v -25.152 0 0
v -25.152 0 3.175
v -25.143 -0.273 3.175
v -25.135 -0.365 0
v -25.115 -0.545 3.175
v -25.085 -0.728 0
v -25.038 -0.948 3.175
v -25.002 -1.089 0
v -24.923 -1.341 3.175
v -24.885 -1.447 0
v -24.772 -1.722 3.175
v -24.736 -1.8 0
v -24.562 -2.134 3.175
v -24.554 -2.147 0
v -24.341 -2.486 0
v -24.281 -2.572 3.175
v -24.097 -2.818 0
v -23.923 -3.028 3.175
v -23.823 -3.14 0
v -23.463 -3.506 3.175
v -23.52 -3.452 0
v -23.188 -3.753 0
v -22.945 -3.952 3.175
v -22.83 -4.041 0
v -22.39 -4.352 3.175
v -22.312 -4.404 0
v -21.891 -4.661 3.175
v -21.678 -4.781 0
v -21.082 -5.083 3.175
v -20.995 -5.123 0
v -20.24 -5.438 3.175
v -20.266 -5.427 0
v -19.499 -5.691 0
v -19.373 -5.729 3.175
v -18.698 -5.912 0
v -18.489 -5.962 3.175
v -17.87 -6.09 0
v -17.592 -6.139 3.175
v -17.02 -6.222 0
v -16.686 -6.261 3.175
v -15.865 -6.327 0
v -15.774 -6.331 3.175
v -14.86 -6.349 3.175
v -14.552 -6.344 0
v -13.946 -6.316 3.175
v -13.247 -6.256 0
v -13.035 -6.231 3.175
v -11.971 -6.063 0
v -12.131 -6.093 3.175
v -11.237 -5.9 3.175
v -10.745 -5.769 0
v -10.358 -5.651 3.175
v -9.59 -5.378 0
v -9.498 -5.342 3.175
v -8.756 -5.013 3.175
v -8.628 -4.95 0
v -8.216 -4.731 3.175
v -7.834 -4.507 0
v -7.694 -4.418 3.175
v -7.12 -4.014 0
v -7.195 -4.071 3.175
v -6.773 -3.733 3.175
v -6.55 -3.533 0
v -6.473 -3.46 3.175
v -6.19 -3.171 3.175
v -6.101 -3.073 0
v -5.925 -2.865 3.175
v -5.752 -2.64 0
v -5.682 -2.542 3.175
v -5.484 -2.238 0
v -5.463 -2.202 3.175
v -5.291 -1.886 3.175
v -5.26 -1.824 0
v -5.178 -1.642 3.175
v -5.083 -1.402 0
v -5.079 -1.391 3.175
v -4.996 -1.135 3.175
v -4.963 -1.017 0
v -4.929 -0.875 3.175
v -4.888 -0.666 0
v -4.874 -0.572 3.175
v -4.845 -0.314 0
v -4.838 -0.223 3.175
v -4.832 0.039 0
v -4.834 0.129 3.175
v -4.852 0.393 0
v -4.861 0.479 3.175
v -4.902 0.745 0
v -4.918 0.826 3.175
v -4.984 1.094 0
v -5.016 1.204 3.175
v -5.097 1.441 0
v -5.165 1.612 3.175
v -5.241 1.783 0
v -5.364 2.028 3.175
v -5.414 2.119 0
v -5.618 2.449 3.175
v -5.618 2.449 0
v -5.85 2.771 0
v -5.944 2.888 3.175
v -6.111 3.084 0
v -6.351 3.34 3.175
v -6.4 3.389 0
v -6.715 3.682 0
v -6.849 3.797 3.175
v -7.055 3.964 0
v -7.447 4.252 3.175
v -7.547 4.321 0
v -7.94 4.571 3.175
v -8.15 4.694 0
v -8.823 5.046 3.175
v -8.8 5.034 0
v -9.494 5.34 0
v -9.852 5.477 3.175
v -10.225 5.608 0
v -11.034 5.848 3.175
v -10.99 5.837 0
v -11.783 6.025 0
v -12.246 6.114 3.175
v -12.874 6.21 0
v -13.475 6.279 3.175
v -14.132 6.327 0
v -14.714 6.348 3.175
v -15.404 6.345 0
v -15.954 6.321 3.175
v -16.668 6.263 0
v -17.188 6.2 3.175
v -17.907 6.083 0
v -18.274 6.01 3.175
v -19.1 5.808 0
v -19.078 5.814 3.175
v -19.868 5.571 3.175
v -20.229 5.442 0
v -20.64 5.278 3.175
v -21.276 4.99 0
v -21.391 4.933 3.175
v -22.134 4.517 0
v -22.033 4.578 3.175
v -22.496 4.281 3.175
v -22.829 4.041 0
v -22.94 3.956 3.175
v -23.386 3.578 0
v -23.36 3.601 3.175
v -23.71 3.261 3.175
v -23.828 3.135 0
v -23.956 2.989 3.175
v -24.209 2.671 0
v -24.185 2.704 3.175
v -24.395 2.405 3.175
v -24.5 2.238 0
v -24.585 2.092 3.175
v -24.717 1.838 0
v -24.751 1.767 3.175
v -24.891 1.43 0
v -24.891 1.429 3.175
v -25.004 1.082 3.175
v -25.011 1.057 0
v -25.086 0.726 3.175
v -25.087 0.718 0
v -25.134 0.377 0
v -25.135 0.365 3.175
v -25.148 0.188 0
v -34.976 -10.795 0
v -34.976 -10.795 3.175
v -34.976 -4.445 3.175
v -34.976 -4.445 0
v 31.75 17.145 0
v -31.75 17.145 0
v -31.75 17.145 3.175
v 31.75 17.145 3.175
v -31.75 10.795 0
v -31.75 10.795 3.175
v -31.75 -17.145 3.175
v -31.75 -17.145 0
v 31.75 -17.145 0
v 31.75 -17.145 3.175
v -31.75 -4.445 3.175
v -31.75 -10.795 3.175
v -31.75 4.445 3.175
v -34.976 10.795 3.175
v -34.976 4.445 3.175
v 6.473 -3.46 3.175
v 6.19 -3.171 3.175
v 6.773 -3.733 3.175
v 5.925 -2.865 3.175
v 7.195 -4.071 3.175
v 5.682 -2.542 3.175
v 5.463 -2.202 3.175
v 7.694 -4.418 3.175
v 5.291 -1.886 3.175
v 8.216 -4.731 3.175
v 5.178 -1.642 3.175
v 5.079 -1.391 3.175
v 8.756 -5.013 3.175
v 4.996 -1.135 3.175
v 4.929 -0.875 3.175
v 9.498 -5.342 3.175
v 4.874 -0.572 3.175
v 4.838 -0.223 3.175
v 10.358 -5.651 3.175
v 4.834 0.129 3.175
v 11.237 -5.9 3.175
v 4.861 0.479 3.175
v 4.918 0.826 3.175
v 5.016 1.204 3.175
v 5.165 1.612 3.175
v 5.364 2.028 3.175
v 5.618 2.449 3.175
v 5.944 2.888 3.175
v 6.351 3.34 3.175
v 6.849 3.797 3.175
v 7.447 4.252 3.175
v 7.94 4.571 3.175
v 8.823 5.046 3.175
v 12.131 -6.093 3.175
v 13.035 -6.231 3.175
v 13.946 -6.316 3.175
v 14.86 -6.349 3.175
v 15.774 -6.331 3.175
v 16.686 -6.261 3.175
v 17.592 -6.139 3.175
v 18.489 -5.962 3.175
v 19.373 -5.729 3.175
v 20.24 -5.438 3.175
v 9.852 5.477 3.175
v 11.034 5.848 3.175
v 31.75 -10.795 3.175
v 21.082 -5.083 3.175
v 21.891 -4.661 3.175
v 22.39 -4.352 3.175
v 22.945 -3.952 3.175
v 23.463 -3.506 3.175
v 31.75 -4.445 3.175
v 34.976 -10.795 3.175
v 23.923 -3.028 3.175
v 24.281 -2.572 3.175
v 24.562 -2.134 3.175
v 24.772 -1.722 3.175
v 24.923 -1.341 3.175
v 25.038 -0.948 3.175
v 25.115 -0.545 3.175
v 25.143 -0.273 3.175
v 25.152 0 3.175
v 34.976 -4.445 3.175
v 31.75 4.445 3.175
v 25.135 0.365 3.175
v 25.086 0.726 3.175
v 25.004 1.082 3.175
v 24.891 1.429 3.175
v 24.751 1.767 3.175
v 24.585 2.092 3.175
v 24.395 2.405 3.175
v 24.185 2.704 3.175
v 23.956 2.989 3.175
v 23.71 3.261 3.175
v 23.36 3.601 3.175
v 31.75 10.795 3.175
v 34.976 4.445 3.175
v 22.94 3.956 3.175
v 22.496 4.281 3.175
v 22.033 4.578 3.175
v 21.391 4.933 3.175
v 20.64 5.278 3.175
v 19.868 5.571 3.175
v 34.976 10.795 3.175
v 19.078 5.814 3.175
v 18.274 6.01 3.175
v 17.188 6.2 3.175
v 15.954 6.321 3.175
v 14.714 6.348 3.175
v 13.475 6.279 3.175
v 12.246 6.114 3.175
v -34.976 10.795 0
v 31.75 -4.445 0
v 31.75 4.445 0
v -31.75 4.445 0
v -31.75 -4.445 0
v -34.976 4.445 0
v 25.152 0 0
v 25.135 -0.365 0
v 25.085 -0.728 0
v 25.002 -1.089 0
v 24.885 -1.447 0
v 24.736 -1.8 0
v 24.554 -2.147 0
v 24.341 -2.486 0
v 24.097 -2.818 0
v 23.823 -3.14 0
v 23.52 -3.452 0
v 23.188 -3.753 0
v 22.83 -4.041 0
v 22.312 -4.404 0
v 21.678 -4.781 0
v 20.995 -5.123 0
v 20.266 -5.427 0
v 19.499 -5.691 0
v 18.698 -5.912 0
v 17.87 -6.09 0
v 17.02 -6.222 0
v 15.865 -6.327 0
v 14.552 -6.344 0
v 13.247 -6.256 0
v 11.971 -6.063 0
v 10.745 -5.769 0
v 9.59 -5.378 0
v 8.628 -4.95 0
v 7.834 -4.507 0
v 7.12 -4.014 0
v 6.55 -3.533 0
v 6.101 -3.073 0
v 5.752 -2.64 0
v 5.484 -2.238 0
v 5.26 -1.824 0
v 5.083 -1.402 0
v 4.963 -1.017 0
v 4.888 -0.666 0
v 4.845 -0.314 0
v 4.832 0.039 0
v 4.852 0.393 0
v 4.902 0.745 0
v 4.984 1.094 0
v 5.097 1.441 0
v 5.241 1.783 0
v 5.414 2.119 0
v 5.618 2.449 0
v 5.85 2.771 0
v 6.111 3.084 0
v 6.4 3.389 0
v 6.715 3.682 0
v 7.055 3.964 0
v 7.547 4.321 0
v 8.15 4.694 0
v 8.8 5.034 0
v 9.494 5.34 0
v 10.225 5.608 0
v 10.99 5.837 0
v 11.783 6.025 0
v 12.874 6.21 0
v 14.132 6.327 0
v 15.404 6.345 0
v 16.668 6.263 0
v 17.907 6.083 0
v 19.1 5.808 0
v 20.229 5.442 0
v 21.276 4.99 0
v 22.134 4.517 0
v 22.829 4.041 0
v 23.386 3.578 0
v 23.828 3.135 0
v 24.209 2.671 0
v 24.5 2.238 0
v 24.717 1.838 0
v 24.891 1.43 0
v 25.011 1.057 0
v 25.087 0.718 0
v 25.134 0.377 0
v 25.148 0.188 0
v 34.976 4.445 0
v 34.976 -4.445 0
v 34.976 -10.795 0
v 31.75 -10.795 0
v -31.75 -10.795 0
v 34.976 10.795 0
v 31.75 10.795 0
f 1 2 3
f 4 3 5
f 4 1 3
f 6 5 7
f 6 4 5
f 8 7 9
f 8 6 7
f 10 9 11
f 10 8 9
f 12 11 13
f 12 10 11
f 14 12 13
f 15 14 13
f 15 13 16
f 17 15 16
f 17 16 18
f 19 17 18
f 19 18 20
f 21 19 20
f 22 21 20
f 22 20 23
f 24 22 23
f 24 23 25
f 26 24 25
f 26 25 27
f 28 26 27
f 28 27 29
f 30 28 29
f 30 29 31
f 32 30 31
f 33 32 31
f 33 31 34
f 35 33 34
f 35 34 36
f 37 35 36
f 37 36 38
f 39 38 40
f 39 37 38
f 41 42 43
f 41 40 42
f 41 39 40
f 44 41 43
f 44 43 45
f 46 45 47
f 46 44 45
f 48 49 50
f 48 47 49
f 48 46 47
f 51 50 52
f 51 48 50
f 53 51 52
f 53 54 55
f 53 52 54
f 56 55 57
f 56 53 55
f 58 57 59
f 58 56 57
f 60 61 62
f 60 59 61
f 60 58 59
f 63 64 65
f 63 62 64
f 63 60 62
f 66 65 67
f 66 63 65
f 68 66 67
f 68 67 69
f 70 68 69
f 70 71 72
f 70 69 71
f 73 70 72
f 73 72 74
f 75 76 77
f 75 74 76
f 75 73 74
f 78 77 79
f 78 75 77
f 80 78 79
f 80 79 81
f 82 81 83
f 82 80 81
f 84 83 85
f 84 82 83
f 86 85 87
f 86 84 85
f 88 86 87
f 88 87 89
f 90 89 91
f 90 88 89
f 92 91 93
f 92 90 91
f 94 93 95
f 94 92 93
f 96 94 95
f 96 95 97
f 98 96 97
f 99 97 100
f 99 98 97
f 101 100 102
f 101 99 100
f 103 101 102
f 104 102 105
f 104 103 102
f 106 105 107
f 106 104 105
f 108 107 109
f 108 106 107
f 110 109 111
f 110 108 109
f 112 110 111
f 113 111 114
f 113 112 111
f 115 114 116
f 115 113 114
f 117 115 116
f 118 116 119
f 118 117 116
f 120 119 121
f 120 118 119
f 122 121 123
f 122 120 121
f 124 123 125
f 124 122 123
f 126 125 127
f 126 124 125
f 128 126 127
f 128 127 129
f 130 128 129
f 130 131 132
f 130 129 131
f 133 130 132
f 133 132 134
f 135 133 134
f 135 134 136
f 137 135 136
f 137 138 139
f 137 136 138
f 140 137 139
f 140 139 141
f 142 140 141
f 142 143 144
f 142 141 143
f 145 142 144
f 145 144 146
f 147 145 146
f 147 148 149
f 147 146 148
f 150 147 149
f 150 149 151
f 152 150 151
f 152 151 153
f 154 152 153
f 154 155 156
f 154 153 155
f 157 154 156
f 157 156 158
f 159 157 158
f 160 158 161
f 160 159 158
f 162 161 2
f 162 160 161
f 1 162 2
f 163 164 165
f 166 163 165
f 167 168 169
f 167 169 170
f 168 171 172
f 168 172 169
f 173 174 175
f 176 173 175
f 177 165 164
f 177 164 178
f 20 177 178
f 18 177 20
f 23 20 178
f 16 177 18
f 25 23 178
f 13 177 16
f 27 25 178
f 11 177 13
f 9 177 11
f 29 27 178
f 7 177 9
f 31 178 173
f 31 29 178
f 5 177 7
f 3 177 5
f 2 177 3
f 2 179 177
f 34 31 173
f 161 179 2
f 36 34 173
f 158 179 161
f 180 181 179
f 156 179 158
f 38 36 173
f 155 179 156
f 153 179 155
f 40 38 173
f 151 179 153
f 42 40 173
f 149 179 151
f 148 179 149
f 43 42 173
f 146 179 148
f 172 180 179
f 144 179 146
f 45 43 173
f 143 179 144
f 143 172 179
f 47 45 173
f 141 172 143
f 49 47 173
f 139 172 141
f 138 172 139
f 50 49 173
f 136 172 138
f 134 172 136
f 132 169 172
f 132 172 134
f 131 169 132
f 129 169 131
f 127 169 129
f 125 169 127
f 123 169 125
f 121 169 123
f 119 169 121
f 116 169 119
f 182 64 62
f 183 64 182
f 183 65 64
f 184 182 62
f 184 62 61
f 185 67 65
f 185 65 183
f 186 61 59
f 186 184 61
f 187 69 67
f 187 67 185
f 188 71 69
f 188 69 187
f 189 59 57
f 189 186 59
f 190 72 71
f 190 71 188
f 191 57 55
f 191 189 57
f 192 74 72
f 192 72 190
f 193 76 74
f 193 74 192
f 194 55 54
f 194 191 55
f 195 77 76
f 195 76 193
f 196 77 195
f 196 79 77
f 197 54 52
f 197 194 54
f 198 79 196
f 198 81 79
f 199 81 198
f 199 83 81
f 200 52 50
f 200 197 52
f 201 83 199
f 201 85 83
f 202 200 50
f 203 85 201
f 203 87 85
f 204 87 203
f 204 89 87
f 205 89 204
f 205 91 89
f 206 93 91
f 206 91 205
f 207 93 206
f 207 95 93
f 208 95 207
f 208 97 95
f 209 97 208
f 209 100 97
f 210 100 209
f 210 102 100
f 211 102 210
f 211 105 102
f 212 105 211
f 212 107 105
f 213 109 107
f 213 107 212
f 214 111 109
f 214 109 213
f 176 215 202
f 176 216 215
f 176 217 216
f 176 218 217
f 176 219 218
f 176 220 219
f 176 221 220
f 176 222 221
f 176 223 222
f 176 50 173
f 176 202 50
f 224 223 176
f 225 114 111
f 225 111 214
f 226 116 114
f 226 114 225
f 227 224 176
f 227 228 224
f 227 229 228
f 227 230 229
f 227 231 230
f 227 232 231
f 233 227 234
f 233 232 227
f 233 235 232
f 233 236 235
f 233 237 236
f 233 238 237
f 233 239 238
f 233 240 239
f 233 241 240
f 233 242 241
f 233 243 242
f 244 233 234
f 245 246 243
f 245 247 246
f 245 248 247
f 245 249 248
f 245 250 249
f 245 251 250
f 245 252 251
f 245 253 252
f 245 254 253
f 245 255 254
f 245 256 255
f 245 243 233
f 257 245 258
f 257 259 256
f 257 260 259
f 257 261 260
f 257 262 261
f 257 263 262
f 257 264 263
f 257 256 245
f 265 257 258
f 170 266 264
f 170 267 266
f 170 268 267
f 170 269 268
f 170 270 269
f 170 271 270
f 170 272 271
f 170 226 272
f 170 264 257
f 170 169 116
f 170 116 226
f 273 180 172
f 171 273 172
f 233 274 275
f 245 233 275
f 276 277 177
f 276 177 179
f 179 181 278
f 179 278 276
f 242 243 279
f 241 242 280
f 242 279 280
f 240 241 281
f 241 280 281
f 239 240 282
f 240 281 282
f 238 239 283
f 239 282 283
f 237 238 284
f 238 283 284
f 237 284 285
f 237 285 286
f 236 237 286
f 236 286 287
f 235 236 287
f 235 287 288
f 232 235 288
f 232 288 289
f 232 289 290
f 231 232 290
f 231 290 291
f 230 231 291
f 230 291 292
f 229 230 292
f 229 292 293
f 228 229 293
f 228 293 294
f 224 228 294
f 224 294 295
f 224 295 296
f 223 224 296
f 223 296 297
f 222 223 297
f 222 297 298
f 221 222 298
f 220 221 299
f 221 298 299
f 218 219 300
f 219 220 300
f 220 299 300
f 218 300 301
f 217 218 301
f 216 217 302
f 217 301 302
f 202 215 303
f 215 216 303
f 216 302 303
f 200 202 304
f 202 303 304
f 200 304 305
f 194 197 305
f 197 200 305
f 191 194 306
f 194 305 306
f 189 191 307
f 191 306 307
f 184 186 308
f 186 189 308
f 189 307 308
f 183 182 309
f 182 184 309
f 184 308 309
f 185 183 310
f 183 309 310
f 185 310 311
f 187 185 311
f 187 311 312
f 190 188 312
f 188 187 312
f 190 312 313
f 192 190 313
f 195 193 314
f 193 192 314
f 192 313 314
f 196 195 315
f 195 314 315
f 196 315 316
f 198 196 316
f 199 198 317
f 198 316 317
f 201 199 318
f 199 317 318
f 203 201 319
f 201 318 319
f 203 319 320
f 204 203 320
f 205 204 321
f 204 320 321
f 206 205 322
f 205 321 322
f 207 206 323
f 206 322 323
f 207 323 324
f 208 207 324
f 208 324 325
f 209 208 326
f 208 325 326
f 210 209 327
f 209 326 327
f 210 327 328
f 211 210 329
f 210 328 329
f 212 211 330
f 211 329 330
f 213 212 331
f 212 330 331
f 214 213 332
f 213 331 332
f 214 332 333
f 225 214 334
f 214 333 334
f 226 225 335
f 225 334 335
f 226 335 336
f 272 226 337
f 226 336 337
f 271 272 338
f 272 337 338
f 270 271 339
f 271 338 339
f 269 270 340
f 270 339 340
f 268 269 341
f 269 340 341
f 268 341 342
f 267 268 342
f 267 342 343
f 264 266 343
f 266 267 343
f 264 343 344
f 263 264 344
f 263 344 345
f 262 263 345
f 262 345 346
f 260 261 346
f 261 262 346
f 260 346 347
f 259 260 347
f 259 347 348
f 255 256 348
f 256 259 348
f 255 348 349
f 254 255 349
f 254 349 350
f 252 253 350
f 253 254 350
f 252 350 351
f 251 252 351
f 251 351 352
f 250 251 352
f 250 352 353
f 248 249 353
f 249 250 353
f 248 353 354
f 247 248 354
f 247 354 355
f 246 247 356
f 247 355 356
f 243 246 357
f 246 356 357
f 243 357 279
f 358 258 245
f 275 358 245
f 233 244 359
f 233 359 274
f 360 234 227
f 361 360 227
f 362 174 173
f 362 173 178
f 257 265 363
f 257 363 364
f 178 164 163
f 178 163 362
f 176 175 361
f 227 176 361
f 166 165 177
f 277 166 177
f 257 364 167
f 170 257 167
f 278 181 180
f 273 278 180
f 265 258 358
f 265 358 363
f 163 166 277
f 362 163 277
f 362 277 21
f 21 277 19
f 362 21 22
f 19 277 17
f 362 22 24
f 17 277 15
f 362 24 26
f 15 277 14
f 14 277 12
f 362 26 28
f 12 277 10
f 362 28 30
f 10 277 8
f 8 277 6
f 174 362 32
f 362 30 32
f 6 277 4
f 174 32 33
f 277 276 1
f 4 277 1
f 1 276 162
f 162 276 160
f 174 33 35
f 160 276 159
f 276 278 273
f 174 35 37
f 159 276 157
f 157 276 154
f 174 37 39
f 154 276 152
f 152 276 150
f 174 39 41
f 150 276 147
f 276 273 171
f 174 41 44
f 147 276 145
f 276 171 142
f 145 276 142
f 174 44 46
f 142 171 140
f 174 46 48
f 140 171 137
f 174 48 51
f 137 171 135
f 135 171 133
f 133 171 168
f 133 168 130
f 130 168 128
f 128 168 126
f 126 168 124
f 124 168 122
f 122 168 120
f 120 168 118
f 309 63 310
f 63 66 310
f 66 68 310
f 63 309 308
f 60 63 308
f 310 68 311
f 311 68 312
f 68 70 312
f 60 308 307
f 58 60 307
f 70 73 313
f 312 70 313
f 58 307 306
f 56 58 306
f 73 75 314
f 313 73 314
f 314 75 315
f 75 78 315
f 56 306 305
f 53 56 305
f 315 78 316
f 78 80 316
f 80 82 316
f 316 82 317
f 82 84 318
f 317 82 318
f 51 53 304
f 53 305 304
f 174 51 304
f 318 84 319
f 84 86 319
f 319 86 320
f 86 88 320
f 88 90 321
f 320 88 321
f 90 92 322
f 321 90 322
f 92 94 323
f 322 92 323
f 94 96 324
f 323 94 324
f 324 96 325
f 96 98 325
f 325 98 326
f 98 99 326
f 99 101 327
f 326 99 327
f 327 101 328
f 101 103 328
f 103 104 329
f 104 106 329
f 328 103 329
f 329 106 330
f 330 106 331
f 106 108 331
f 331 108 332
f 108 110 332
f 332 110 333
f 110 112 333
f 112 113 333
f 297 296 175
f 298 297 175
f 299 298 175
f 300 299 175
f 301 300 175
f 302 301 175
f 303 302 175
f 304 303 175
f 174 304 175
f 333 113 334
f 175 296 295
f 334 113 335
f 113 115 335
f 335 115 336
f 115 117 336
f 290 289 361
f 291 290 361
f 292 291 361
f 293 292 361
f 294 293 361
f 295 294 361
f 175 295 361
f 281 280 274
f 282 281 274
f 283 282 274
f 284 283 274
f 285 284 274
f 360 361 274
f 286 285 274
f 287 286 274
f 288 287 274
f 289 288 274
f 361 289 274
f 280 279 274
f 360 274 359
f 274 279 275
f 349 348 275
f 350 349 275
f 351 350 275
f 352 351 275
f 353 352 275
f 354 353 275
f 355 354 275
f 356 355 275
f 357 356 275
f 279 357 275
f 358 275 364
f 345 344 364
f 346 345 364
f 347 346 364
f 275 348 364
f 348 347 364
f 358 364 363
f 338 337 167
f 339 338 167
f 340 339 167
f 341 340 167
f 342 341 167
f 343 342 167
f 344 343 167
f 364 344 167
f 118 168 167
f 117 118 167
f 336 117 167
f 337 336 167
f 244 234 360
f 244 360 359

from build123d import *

# Parameters (mm, degrees)
SKETCH1_W                      = 63.5
SKETCH1_H                      = 34.29
BOSS_EXTRUDE1_DEPTH            = 3.175
SKETCH2_W                      = 3.2258
SKETCH2_H                      = 6.35
BOSS_EXTRUDE2_DEPTH            = 3.175
SKETCH3_RX                     = 10.16
SKETCH3_RY                     = 6.35
CUT_FOR_LIP_MOTOR_CABLES_DEPTH = 4.175


with BuildPart() as part:
    # Sketch1 → Boss-Extrude1 (new body)
    with BuildSketch(Plane.XY):
        Rectangle(SKETCH1_W, SKETCH1_H)
    extrude(amount=BOSS_EXTRUDE1_DEPTH)

    # Sketch2 → Boss-Extrude2 (add)
    with BuildSketch(Plane.XY.offset(3.175)):
        with Locations((-33.3629, 7.62)):
            Rectangle(SKETCH2_W, SKETCH2_H)
        with Locations((-33.3629, -7.62)):
            Rectangle(SKETCH2_W, SKETCH2_H)
    boss_extrude2 = extrude(amount=-BOSS_EXTRUDE2_DEPTH)

    # Mirror1: Boss-Extrude2 across plane
    add(boss_extrude2.mirror(Plane(origin=(0, 0, 0), x_dir=(0, 0, 1), z_dir=(1, 0, 0))))

    # Sketch3 → cut for lip motor cables (cut, through all)
    with BuildSketch(Plane(origin=(0, 0, 0), x_dir=(-1, 0, 0), z_dir=(0, 0, -1))):
        with Locations(Location((-14.992180724, 0), (0, 0, 180))):
            Ellipse(SKETCH3_RX, SKETCH3_RY)
    cut_for_lip_motor_cables = extrude(amount=-CUT_FOR_LIP_MOTOR_CABLES_DEPTH, mode=Mode.SUBTRACT)

    # Mirror2: cut for lip motor cables across plane
    add(cut_for_lip_motor_cables.mirror(Plane(origin=(0, 0, 0), x_dir=(0, 0, 1), z_dir=(1, 0, 0))), mode=Mode.SUBTRACT)


solid = part.part
